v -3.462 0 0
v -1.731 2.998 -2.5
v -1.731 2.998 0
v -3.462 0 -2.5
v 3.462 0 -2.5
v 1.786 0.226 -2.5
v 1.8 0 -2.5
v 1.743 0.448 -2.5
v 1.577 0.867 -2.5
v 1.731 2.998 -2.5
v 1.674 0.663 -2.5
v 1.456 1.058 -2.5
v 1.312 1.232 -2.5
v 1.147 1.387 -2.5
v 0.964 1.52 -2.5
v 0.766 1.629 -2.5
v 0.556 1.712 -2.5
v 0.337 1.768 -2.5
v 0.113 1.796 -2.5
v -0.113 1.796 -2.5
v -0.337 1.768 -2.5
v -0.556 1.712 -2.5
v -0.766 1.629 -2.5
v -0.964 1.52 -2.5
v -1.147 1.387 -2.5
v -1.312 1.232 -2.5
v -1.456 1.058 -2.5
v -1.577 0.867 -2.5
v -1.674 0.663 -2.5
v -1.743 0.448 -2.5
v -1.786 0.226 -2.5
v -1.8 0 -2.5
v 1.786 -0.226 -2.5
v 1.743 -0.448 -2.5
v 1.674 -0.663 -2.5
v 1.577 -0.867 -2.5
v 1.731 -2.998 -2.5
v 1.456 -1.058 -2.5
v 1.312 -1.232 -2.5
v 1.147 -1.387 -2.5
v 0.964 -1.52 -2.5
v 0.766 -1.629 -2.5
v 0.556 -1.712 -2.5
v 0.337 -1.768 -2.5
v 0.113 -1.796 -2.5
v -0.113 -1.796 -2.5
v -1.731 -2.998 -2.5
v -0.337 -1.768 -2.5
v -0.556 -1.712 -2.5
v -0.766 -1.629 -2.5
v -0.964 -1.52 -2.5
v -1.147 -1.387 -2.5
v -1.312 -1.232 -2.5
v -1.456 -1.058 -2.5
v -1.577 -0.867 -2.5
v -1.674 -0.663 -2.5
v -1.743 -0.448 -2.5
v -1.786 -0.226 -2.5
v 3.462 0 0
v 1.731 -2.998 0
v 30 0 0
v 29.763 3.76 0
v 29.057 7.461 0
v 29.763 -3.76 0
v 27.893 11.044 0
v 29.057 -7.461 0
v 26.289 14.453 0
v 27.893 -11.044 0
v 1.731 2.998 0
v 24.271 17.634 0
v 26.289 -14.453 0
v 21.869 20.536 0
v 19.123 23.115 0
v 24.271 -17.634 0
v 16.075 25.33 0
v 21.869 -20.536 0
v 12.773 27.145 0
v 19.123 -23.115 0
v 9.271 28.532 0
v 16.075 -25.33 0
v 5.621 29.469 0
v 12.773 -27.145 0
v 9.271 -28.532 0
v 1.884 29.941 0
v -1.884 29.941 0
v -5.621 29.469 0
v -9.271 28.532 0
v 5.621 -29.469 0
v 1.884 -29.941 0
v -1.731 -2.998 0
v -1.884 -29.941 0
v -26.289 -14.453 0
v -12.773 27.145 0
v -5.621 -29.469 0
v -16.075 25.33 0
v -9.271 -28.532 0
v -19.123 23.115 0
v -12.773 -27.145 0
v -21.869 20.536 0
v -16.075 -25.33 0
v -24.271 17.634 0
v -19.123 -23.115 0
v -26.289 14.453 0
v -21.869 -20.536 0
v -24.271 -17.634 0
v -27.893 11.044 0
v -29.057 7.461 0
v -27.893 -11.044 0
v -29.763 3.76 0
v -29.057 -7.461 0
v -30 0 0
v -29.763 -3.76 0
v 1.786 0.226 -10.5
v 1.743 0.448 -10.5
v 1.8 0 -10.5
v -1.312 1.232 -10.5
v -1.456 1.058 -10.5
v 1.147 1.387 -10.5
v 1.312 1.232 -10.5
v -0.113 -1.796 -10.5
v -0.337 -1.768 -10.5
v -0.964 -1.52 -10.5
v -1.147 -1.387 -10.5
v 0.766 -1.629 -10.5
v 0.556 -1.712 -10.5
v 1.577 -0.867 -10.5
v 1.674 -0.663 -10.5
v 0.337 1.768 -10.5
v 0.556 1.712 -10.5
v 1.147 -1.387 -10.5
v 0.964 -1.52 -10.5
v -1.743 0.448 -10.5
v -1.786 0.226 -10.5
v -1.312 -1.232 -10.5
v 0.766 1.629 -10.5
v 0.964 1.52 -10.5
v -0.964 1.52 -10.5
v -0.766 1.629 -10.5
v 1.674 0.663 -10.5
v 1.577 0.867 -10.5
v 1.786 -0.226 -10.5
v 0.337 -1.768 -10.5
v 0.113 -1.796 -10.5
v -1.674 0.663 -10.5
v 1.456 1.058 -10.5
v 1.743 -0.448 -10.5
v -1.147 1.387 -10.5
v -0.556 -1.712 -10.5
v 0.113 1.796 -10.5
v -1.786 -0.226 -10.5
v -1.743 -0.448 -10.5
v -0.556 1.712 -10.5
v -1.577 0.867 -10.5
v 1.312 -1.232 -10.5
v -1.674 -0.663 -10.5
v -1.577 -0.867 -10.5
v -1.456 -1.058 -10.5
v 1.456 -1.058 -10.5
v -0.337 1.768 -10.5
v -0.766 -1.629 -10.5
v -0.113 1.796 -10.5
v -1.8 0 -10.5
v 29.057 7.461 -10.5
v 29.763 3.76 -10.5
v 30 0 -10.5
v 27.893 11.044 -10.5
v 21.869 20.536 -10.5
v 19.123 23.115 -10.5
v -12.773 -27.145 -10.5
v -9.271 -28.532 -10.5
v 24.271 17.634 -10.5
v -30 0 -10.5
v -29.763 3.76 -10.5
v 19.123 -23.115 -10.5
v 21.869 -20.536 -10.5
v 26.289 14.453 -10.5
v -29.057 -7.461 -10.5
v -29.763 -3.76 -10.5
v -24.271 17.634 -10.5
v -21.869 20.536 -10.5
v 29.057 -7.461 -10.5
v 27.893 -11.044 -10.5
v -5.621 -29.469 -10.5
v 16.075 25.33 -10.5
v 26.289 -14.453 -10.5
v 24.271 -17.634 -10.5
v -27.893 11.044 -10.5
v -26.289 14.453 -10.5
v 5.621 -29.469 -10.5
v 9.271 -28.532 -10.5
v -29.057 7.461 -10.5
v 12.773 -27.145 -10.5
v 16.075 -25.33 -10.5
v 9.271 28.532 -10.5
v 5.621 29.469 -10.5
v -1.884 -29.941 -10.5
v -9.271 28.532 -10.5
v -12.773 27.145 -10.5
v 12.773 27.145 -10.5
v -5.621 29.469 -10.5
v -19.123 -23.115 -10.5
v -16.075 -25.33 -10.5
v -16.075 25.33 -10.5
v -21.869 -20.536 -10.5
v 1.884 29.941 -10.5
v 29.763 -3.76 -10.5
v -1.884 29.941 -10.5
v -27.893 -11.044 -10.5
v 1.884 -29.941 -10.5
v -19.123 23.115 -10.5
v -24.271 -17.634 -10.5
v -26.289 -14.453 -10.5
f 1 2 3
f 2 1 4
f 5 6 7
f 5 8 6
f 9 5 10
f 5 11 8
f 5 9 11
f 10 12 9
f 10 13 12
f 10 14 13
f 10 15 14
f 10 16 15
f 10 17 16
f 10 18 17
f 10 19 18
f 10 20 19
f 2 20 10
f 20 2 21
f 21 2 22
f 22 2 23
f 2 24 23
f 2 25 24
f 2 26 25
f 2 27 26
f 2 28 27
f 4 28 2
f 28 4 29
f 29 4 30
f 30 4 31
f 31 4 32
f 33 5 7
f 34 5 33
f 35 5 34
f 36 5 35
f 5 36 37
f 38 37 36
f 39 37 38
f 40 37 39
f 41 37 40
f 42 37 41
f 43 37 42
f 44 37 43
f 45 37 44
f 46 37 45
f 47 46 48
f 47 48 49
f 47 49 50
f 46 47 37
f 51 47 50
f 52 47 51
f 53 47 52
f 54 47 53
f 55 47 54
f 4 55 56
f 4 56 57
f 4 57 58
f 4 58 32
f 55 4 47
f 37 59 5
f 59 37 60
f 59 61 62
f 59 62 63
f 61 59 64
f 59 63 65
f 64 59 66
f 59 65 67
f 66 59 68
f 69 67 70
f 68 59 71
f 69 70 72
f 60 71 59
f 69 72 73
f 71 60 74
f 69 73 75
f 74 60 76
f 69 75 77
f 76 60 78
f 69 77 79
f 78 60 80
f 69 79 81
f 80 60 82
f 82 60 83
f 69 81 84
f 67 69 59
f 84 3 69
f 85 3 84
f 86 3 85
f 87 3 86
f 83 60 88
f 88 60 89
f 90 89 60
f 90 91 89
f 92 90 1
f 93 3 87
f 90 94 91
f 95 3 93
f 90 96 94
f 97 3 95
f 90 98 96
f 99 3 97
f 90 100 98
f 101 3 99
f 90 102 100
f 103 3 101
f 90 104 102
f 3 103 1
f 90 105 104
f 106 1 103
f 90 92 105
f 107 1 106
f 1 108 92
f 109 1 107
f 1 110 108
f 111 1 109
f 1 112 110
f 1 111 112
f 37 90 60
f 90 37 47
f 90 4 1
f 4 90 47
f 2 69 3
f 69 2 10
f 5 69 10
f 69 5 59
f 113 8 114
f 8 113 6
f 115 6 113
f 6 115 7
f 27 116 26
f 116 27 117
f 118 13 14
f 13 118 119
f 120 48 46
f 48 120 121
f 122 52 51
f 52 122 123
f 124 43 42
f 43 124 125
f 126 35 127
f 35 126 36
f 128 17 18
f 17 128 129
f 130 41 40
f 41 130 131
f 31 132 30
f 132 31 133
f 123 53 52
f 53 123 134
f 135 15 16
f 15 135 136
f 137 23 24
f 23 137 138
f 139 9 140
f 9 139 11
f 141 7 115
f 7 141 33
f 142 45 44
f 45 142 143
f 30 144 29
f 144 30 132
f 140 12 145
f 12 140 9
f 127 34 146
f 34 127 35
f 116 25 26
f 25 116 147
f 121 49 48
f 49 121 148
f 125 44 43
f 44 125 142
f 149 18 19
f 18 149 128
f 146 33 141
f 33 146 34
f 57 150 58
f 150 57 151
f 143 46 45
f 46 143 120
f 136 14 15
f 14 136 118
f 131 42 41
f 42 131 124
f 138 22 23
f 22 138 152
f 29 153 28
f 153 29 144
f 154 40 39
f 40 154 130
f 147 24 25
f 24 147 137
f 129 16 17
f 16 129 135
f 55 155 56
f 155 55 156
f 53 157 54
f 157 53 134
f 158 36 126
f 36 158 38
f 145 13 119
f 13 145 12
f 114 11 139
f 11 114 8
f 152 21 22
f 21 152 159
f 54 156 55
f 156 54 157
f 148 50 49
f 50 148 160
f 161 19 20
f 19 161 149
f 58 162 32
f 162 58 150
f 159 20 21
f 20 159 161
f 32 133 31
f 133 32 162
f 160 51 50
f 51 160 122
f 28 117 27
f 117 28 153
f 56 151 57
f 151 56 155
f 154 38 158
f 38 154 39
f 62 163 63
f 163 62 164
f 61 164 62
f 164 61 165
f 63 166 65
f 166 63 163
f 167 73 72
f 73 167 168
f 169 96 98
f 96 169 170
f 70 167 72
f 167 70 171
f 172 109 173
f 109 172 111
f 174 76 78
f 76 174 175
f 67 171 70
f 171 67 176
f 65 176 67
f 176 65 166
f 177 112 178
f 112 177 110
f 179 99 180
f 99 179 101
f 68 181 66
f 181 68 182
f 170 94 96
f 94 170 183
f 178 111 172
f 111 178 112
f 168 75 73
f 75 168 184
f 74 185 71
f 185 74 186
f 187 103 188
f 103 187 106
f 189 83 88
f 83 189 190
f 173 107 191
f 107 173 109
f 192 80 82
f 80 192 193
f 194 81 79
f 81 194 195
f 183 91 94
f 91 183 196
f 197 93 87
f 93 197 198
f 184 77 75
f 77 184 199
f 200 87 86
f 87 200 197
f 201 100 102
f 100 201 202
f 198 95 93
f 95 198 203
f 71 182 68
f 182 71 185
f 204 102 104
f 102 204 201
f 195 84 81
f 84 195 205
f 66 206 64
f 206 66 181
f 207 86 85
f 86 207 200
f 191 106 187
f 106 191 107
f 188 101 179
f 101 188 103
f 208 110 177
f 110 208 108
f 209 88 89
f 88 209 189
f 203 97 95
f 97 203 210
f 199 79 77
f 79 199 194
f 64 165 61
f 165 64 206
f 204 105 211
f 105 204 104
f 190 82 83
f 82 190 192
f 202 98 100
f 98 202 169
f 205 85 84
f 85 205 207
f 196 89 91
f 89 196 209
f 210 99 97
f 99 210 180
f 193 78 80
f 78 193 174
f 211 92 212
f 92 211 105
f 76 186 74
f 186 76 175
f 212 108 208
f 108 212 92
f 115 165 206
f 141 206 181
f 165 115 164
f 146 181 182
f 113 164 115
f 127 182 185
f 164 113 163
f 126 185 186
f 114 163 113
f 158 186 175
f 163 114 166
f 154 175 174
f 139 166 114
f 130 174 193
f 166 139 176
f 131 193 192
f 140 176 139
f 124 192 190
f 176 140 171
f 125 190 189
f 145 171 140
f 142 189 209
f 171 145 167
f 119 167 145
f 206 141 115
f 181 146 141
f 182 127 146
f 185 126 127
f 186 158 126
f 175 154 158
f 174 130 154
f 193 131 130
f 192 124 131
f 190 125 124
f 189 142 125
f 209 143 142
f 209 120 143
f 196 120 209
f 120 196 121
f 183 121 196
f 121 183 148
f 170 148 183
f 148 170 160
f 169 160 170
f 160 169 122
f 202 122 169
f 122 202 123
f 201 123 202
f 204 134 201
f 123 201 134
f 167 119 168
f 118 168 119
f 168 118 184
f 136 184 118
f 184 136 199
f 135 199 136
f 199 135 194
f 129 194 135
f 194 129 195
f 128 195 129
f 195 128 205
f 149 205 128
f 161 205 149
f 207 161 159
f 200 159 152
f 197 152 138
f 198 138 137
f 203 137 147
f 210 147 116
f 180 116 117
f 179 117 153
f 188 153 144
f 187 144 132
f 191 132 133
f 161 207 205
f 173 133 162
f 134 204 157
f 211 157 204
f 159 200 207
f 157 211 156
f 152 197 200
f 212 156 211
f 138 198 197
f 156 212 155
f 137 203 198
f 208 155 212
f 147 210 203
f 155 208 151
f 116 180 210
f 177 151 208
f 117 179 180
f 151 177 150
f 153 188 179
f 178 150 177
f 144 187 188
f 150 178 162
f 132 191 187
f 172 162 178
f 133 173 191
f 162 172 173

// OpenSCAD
$fn = 50;

difference() {
	union() {
		translate(v = [0, 0, -10.5]) {
			cylinder(h = 10.5, r = 30.0);
		}
	}
	union() {
		translate(v = [0, 0, 0]) {
			rotate(a = [0, 0, 0]) {
				difference() {
					union() {
						translate(v = [0, 0, -2.5]) {
							linear_extrude(height = 2.5) {
								polygon(points = [[3.4619999999999997, 0.0], [1.7310000000000003, 2.9981799479017264], [-1.7309999999999992, 2.9981799479017264], [-3.4619999999999997, 4.2397272186481365e-16], [-1.7310000000000014, -2.998179947901726], [1.7309999999999977, -2.9981799479017277]]);
							}
						}
					}
					union();
				}
			}
		}
		#translate(v = [0, 0, -100.0]) {
			cylinder(h = 200, r = 1.8);
		}
	}
}
